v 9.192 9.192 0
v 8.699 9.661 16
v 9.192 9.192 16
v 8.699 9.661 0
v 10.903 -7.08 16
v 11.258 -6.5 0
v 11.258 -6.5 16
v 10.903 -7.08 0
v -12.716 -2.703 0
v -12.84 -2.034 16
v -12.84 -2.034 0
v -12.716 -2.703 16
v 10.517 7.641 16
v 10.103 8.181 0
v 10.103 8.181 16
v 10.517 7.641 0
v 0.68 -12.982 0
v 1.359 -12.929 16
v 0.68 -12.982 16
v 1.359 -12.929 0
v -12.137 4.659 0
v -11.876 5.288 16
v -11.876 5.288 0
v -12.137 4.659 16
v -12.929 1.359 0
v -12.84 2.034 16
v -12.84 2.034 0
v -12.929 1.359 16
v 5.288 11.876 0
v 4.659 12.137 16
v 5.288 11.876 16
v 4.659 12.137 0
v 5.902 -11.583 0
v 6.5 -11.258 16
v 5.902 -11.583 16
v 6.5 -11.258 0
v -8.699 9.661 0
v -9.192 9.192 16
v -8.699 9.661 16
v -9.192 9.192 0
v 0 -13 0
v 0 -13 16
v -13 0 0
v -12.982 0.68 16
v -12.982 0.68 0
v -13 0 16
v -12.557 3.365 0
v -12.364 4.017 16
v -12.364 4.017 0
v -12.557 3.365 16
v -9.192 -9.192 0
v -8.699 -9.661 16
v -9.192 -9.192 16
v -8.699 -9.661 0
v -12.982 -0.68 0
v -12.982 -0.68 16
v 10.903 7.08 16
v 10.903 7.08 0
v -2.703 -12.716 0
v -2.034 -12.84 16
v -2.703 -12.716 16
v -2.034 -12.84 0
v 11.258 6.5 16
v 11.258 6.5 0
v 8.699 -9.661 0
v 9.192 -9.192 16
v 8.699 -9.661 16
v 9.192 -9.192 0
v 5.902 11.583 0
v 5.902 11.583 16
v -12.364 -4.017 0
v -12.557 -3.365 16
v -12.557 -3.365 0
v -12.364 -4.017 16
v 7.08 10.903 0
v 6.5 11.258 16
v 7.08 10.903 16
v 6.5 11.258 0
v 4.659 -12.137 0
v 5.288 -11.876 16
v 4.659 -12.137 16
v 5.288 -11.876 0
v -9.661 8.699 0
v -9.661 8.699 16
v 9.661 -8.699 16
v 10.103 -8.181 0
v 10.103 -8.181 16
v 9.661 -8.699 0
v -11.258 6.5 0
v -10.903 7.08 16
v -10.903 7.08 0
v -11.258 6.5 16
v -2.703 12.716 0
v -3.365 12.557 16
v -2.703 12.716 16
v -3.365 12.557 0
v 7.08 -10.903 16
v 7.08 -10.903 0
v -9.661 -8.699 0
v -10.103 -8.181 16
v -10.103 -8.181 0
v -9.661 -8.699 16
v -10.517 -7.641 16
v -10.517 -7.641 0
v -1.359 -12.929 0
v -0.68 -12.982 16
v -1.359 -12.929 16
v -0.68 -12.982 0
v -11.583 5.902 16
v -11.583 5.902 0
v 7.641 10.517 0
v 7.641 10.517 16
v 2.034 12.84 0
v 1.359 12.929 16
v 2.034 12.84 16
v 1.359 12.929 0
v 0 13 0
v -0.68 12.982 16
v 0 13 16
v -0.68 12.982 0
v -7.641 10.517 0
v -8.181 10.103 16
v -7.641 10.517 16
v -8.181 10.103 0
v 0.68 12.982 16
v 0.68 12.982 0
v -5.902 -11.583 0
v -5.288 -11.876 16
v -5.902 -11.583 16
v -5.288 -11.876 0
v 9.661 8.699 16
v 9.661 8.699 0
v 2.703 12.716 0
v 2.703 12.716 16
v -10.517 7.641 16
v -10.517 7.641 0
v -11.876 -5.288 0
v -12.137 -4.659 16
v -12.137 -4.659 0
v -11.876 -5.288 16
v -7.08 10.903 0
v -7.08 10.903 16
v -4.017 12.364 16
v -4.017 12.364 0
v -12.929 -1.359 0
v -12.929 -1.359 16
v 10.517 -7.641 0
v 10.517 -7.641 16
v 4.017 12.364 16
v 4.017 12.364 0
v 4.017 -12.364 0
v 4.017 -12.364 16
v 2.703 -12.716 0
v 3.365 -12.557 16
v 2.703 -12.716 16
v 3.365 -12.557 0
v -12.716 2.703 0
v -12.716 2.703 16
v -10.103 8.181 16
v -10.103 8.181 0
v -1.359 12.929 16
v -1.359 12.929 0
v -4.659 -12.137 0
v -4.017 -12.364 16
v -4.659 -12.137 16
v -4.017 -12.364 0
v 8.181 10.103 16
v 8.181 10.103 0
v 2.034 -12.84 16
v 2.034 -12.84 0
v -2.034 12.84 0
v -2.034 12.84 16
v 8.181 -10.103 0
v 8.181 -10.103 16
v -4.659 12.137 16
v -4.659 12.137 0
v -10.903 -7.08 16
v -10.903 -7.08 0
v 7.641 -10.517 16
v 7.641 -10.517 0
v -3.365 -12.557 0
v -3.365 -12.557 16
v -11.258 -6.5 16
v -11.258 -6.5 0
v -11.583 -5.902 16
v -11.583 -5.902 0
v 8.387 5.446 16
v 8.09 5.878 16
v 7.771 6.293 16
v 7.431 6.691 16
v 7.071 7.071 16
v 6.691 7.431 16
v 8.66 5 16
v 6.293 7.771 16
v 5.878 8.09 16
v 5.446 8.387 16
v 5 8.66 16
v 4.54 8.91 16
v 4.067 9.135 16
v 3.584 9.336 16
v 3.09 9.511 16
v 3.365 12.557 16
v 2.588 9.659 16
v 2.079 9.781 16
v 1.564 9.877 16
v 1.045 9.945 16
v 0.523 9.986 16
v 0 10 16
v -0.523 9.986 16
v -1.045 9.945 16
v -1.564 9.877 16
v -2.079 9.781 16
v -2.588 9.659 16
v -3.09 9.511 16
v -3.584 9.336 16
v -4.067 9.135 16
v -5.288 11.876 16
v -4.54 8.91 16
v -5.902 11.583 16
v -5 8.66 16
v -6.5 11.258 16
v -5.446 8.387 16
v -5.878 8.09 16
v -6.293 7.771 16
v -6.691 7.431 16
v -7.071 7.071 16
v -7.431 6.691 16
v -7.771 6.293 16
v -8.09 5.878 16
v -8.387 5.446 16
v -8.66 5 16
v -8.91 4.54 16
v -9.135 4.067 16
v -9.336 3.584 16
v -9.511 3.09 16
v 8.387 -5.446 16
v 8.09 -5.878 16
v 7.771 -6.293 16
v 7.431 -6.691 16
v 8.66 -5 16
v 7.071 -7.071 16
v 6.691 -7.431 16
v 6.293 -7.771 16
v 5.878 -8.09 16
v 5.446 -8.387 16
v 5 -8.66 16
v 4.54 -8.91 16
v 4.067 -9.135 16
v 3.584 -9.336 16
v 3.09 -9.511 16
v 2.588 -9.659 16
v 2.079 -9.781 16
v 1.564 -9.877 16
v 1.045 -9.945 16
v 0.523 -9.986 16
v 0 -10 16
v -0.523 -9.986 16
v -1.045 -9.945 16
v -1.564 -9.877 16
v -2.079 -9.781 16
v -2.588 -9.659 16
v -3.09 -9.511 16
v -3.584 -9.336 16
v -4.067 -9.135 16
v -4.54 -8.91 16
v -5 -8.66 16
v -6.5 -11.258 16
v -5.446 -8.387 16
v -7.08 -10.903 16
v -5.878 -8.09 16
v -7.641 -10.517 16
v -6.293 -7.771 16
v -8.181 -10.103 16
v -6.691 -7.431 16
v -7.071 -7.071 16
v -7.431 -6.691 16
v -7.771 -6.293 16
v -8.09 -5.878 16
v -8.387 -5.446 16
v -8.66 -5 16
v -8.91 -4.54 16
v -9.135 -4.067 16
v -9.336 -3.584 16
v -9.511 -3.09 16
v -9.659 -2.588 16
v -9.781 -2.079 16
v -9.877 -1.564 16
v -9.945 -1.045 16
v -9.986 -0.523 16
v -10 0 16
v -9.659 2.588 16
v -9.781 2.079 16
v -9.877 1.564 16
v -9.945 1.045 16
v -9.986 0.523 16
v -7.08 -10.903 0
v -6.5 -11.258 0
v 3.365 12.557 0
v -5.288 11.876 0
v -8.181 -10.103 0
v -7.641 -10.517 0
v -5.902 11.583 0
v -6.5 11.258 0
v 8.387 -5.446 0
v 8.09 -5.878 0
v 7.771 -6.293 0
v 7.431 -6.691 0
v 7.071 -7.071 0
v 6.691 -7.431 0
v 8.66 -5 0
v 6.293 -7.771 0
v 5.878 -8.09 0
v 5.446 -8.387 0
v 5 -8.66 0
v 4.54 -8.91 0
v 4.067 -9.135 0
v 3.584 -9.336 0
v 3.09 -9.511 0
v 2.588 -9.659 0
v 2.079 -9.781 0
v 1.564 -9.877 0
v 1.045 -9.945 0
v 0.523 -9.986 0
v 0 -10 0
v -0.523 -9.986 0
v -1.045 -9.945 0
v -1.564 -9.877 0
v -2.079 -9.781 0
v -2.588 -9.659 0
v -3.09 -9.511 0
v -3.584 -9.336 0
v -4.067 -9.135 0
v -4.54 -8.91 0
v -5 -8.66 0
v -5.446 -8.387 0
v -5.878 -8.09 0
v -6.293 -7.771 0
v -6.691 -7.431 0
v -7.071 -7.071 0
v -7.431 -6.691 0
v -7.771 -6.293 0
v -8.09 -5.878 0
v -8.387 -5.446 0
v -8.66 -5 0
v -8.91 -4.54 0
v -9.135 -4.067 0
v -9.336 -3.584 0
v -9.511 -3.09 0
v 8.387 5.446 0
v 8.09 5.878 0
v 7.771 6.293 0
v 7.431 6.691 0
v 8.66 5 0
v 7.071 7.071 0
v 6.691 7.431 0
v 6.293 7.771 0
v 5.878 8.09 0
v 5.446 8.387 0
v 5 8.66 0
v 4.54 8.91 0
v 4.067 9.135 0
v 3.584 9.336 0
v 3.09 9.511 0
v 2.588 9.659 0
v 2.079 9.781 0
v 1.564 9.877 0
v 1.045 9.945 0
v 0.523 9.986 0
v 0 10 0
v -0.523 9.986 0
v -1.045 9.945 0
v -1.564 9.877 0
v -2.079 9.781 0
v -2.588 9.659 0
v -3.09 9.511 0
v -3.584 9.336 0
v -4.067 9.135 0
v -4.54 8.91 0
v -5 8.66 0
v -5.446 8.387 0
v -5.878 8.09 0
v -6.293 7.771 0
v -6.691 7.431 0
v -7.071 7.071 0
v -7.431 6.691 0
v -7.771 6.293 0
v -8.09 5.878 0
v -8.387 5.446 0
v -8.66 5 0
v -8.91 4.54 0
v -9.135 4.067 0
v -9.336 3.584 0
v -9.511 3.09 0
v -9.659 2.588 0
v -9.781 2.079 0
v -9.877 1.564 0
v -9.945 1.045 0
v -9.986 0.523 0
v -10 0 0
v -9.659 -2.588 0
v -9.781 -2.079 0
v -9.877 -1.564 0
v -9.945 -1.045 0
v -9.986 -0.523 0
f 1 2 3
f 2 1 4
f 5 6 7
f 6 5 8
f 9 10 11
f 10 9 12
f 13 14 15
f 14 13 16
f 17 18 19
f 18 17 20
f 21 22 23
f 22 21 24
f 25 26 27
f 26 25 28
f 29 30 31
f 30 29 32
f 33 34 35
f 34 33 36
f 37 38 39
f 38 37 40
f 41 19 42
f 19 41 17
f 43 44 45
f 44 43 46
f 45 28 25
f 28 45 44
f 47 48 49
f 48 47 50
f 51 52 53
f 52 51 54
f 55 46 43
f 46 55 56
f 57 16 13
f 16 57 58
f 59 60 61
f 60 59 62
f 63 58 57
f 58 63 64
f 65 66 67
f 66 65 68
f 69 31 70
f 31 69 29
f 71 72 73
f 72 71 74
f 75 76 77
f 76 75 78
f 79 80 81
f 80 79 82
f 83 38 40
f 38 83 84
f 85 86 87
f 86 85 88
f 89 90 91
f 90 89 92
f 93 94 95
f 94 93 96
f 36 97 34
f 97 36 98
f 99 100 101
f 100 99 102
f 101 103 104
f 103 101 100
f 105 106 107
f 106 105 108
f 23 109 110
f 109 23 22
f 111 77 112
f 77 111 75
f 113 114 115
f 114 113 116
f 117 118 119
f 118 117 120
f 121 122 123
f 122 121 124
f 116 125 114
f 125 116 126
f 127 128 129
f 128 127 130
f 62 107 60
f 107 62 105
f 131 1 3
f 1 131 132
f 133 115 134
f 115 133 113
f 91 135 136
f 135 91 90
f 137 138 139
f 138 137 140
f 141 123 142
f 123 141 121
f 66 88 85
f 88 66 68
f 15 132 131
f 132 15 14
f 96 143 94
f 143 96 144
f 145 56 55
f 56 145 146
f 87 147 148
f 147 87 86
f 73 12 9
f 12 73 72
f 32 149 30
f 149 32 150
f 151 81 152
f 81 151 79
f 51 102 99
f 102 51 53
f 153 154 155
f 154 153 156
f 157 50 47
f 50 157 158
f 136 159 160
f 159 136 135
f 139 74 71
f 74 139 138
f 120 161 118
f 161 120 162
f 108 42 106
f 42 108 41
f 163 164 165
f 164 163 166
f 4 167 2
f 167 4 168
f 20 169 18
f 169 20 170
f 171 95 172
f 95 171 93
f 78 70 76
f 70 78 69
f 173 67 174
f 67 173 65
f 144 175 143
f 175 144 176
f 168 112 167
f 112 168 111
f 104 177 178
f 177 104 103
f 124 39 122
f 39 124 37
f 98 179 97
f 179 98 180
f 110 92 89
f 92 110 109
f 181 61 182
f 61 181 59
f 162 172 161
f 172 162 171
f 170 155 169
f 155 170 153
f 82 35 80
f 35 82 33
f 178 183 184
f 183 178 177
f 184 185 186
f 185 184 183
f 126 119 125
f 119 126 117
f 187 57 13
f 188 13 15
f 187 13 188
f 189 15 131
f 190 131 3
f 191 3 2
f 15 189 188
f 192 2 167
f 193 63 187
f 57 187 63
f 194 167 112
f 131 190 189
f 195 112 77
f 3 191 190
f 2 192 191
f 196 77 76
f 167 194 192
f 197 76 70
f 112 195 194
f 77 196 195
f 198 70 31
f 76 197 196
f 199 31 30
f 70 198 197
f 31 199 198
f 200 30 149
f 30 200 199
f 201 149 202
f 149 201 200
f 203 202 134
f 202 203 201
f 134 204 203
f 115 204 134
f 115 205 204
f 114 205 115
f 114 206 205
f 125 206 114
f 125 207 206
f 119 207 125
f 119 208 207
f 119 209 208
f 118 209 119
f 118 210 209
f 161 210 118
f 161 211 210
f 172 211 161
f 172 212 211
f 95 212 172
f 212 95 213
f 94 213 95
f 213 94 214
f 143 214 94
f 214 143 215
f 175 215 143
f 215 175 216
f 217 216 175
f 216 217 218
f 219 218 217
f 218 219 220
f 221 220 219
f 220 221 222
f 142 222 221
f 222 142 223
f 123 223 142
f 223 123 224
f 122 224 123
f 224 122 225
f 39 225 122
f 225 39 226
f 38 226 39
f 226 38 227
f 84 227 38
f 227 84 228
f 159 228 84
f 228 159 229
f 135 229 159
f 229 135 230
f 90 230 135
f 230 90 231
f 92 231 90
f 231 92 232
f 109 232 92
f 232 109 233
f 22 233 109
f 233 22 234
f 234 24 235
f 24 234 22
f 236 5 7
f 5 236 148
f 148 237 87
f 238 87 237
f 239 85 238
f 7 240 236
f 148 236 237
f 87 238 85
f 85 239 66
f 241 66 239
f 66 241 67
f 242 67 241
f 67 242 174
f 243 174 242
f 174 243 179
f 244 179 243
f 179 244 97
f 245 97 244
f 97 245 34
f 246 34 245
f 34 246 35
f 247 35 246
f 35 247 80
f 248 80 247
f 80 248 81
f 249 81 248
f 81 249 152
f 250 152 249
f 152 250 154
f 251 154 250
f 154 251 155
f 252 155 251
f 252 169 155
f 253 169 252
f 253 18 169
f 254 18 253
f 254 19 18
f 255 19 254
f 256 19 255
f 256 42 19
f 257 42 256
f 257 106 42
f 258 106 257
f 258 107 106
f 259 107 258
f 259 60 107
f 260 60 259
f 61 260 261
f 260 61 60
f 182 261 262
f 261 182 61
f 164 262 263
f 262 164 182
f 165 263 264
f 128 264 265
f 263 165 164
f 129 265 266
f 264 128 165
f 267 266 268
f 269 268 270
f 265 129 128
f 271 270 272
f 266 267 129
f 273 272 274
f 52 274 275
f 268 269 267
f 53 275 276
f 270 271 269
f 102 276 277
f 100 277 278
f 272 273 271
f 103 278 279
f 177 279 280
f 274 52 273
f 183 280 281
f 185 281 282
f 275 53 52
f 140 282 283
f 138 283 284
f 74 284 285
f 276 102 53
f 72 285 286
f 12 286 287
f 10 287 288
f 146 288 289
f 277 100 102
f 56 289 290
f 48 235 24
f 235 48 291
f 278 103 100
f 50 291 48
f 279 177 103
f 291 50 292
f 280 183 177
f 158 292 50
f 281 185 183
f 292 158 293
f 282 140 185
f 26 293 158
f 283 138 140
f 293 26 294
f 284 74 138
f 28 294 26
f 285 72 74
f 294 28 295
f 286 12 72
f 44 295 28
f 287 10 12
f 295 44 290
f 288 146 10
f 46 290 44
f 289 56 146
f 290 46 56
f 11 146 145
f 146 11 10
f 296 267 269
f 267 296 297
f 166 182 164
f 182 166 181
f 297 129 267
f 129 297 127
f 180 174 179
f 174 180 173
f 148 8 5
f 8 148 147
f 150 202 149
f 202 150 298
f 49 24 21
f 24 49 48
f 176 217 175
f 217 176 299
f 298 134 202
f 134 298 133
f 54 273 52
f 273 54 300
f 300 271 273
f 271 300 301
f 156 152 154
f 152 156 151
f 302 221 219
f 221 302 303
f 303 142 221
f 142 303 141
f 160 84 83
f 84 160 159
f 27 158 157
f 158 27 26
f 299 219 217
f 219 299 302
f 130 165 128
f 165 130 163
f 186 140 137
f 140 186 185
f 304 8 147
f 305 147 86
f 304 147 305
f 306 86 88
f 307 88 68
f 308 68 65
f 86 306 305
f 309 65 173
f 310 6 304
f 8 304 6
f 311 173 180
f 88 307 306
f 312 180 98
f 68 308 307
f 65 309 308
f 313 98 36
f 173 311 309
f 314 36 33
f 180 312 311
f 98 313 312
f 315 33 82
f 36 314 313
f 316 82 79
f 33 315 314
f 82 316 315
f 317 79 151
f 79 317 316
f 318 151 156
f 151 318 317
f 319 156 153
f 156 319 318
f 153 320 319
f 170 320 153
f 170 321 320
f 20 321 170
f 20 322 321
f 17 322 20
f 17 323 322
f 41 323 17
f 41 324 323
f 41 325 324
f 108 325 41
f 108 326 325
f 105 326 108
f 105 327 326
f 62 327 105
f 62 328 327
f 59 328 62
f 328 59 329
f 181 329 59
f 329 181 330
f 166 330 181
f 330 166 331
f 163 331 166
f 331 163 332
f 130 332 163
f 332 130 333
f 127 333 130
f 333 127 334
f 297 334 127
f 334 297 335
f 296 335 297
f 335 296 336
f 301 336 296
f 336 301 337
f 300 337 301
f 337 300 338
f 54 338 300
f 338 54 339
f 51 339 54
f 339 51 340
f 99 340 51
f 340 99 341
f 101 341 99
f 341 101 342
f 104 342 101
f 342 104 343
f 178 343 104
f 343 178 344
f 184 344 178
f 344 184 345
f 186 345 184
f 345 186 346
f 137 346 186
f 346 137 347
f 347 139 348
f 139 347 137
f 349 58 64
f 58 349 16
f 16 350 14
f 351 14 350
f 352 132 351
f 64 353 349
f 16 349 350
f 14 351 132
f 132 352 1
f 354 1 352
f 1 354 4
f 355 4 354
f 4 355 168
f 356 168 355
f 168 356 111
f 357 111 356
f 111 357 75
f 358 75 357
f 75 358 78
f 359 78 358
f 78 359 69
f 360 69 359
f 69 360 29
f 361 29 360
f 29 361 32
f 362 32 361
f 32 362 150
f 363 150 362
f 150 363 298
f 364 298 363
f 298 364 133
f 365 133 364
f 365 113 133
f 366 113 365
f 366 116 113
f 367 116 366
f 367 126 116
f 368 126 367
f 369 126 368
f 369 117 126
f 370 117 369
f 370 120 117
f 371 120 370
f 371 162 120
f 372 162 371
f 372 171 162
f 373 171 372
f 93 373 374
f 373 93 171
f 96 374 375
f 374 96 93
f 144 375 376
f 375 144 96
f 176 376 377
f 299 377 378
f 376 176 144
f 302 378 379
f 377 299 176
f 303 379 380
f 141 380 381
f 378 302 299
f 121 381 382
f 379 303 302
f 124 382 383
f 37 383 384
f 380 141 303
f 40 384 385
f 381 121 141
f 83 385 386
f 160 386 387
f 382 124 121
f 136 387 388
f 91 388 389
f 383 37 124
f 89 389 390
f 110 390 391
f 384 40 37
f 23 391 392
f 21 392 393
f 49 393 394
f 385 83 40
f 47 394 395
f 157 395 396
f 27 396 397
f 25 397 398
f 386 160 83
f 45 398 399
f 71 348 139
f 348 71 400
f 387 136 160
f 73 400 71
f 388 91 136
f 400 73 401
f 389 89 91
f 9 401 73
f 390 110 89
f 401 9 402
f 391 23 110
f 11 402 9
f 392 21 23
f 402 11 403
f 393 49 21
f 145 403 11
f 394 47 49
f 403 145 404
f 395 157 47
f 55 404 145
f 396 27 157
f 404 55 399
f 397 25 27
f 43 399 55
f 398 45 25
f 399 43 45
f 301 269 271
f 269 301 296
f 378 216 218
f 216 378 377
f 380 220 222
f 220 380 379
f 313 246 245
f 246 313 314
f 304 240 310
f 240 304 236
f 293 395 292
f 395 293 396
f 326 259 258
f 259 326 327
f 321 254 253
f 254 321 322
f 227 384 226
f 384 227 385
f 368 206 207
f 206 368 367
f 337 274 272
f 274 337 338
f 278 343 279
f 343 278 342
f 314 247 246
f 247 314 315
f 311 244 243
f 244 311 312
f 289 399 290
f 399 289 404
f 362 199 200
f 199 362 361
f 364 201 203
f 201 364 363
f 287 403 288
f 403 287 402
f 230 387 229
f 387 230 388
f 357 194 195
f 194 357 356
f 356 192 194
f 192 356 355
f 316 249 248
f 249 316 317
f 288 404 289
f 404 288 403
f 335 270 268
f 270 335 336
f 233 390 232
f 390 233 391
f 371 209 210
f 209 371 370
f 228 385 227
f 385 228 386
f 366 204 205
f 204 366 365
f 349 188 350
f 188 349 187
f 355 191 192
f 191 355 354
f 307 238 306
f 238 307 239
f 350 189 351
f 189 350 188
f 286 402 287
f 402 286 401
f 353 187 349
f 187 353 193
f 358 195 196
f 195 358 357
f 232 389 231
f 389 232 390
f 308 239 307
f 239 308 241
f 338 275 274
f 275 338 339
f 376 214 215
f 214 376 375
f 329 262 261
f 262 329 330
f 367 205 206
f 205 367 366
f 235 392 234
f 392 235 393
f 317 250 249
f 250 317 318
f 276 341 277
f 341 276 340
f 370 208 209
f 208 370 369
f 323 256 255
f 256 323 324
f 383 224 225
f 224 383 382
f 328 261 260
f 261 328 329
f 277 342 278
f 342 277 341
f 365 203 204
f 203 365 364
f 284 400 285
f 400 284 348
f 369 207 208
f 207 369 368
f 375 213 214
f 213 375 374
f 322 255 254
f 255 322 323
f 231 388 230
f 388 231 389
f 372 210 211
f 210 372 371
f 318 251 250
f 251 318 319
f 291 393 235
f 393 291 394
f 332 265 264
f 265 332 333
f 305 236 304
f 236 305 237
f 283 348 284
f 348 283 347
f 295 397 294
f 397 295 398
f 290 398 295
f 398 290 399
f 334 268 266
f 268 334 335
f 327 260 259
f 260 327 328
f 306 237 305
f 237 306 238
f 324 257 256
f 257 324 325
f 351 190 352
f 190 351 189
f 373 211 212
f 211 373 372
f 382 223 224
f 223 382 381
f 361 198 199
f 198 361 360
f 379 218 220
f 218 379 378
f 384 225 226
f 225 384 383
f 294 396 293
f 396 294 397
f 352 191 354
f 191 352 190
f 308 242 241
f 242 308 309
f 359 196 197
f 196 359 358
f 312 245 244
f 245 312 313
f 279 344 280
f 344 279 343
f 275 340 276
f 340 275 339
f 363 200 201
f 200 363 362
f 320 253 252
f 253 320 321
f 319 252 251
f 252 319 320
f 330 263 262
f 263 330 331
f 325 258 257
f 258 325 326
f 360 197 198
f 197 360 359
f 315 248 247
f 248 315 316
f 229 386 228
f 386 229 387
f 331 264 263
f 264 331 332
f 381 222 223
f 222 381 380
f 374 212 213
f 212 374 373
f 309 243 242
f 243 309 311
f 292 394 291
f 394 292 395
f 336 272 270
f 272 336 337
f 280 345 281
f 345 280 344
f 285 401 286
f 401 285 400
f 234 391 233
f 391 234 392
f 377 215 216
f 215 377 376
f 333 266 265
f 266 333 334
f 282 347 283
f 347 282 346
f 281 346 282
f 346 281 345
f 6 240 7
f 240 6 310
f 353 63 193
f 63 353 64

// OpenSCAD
// file: ../tube-clamp.scad
$fn = 120;
EPS = 0.05;

/* [View] */
design_view = "final"; // [final,01-ring,02-opening]

/* [Clamp] */
tube_diameter = 20;
clearance = 0.0;
wall_thickness = 3;
clamp_width = 16;
opening_angle = 60;


// -----------------------------------------------------------------------------
// Public API
// -----------------------------------------------------------------------------

module tube_clamp(
    tube_diameter,
    clearance,
    wall_thickness,
    clamp_width,
    opening_angle
) {
    assert(tube_diameter > 0, "tube_diameter must be > 0");
    assert(clearance >= 0, "clearance must be >= 0");
    assert(wall_thickness > 0, "wall_thickness must be > 0");
    assert(clamp_width > 0, "clamp_width must be > 0");
    assert(
        opening_angle > 0 && opening_angle < 180,
        "opening_angle must be between 0 and 180 degrees"
    );

    difference() {
        _full_ring(
            tube_diameter,
            clearance,
            wall_thickness,
            clamp_width
        );

        _opening_cutter(
            tube_diameter,
            clearance,
            wall_thickness,
            clamp_width,
            opening_angle
        );
    }
}


module render_tube_clamp(
    mode = "final",
    tube_diameter = 20,
    clearance = 0.0,
    wall_thickness = 3,
    clamp_width = 16,
    opening_angle = 60
) {
    if (mode == "01-ring") {
        _full_ring(
            tube_diameter,
            clearance,
            wall_thickness,
            clamp_width
        );
    } else if (mode == "02-opening") {
        color("lightgray")
            _full_ring(
                tube_diameter,
                clearance,
                wall_thickness,
                clamp_width
            );

        color([1, 0.25, 0.15, 0.55])
            _opening_cutter(
                tube_diameter,
                clearance,
                wall_thickness,
                clamp_width,
                opening_angle
            );
    } else {
        tube_clamp(
            tube_diameter,
            clearance,
            wall_thickness,
            clamp_width,
            opening_angle
        );
    }
}


// -----------------------------------------------------------------------------
// Private implementation
// -----------------------------------------------------------------------------

function _clamp_inner_radius(
    tube_diameter,
    clearance
) =
    (tube_diameter + clearance) / 2;


function _clamp_outer_radius(
    tube_diameter,
    clearance,
    wall_thickness
) =
    _clamp_inner_radius(
        tube_diameter,
        clearance
    ) + wall_thickness;


module _full_ring(
    tube_diameter,
    clearance,
    wall_thickness,
    clamp_width
) {
    inner_r = _clamp_inner_radius(
        tube_diameter,
        clearance
    );

    outer_r = _clamp_outer_radius(
        tube_diameter,
        clearance,
        wall_thickness
    );

    difference() {
        cylinder(
            h = clamp_width,
            r = outer_r
        );

        translate([0, 0, -EPS])
            cylinder(
                h = clamp_width + 2 * EPS,
                r = inner_r
            );
    }
}


module _opening_cutter(
    tube_diameter,
    clearance,
    wall_thickness,
    clamp_width,
    opening_angle
) {
    outer_r = _clamp_outer_radius(
        tube_diameter,
        clearance,
        wall_thickness
    );

    cutter_length = outer_r + 10;
    cutter_half_width =
        cutter_length * tan(opening_angle / 2);

    translate([0, 0, -EPS])
        linear_extrude(
            height = clamp_width + 2 * EPS
        )
            polygon(points = [
                [0, 0],
                [cutter_length, -cutter_half_width],
                [cutter_length,  cutter_half_width]
            ]);
}


// -----------------------------------------------------------------------------
// Direct-open preview
// -----------------------------------------------------------------------------

render_tube_clamp(
    mode = design_view,
    tube_diameter = tube_diameter,
    clearance = clearance,
    wall_thickness = wall_thickness,
    clamp_width = clamp_width,
    opening_angle = opening_angle
);
// main file
use <../tube-clamp.scad>

design_view = is_undef(design_view) ? "final" : design_view;

render_tube_clamp(
    mode = design_view
);
